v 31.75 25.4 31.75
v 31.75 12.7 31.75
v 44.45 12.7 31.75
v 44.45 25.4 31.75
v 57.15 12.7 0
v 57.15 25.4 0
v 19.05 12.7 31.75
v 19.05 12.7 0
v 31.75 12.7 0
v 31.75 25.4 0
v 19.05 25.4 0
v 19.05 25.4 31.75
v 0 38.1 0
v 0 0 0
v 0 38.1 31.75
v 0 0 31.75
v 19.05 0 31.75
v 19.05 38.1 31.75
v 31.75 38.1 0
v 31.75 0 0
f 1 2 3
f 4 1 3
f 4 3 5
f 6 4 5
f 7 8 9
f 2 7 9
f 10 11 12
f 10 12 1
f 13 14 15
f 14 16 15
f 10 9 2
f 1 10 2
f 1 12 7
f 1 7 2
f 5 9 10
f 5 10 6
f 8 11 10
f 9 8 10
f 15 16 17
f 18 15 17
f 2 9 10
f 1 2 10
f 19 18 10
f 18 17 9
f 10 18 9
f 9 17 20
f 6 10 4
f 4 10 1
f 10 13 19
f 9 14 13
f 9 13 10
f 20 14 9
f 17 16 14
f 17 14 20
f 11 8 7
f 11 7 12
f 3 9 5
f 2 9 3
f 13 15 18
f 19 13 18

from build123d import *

# Parameters (mm, degrees)
F0_W      = 31.75
F0_H      = 31.75
F1_DEPTH  = 38.1
F2_W      = 12.7
F2_H      = 31.75
F3_DEPTH  = 57.15
F5_DEPTH  = 25.4
F7_DEPTH  = 12.7
F9_DEPTH  = 38.1
F10_W     = 12.7
F10_H     = 12.7
F11_DEPTH = 31.75


with BuildPart() as f1:
    # F0 (on Front) → F1 (new body)
    with BuildSketch(Plane.XZ):
        with Locations((15.875, 15.875)):
            Rectangle(F0_W, F0_H)
    extrude(amount=-F1_DEPTH)

    # F2 (on Right) → F3 (join)
    with BuildSketch(Plane.YZ):
        with Locations((19.05, 15.875)):
            Rectangle(F2_W, F2_H)
    extrude(amount=F3_DEPTH)

    # F4 (on Front) → F5 (cut)
    with BuildSketch(Plane.XZ):
        Polygon((57.15, 31.75), (44.45, 31.75), (57.15, 0), align=None)
    extrude(amount=-F5_DEPTH, mode=Mode.SUBTRACT)

    # F6 (on Front) → F7 (cut)
    with BuildSketch(Plane.XZ):
        Polygon((31.75, 31.75), (19.05, 31.75), (31.75, 0), align=None)
    extrude(amount=-F7_DEPTH, mode=Mode.SUBTRACT)

    # F8 (on Front) → F9 (cut)
    with BuildSketch(Plane.XZ):
        Polygon((19.05, 31.75), (31.75, 0), (31.75, 31.75), align=None)
    extrude(amount=-F9_DEPTH, mode=Mode.SUBTRACT)


with BuildPart() as f11:
    # F10 (on Top) → F11 (new body)
    with BuildSketch(Plane.XY):
        with Locations((25.4, 19.05)):
            Rectangle(F10_W, F10_H)
    extrude(amount=F11_DEPTH)


solid = Compound([f1.part, f11.part])
